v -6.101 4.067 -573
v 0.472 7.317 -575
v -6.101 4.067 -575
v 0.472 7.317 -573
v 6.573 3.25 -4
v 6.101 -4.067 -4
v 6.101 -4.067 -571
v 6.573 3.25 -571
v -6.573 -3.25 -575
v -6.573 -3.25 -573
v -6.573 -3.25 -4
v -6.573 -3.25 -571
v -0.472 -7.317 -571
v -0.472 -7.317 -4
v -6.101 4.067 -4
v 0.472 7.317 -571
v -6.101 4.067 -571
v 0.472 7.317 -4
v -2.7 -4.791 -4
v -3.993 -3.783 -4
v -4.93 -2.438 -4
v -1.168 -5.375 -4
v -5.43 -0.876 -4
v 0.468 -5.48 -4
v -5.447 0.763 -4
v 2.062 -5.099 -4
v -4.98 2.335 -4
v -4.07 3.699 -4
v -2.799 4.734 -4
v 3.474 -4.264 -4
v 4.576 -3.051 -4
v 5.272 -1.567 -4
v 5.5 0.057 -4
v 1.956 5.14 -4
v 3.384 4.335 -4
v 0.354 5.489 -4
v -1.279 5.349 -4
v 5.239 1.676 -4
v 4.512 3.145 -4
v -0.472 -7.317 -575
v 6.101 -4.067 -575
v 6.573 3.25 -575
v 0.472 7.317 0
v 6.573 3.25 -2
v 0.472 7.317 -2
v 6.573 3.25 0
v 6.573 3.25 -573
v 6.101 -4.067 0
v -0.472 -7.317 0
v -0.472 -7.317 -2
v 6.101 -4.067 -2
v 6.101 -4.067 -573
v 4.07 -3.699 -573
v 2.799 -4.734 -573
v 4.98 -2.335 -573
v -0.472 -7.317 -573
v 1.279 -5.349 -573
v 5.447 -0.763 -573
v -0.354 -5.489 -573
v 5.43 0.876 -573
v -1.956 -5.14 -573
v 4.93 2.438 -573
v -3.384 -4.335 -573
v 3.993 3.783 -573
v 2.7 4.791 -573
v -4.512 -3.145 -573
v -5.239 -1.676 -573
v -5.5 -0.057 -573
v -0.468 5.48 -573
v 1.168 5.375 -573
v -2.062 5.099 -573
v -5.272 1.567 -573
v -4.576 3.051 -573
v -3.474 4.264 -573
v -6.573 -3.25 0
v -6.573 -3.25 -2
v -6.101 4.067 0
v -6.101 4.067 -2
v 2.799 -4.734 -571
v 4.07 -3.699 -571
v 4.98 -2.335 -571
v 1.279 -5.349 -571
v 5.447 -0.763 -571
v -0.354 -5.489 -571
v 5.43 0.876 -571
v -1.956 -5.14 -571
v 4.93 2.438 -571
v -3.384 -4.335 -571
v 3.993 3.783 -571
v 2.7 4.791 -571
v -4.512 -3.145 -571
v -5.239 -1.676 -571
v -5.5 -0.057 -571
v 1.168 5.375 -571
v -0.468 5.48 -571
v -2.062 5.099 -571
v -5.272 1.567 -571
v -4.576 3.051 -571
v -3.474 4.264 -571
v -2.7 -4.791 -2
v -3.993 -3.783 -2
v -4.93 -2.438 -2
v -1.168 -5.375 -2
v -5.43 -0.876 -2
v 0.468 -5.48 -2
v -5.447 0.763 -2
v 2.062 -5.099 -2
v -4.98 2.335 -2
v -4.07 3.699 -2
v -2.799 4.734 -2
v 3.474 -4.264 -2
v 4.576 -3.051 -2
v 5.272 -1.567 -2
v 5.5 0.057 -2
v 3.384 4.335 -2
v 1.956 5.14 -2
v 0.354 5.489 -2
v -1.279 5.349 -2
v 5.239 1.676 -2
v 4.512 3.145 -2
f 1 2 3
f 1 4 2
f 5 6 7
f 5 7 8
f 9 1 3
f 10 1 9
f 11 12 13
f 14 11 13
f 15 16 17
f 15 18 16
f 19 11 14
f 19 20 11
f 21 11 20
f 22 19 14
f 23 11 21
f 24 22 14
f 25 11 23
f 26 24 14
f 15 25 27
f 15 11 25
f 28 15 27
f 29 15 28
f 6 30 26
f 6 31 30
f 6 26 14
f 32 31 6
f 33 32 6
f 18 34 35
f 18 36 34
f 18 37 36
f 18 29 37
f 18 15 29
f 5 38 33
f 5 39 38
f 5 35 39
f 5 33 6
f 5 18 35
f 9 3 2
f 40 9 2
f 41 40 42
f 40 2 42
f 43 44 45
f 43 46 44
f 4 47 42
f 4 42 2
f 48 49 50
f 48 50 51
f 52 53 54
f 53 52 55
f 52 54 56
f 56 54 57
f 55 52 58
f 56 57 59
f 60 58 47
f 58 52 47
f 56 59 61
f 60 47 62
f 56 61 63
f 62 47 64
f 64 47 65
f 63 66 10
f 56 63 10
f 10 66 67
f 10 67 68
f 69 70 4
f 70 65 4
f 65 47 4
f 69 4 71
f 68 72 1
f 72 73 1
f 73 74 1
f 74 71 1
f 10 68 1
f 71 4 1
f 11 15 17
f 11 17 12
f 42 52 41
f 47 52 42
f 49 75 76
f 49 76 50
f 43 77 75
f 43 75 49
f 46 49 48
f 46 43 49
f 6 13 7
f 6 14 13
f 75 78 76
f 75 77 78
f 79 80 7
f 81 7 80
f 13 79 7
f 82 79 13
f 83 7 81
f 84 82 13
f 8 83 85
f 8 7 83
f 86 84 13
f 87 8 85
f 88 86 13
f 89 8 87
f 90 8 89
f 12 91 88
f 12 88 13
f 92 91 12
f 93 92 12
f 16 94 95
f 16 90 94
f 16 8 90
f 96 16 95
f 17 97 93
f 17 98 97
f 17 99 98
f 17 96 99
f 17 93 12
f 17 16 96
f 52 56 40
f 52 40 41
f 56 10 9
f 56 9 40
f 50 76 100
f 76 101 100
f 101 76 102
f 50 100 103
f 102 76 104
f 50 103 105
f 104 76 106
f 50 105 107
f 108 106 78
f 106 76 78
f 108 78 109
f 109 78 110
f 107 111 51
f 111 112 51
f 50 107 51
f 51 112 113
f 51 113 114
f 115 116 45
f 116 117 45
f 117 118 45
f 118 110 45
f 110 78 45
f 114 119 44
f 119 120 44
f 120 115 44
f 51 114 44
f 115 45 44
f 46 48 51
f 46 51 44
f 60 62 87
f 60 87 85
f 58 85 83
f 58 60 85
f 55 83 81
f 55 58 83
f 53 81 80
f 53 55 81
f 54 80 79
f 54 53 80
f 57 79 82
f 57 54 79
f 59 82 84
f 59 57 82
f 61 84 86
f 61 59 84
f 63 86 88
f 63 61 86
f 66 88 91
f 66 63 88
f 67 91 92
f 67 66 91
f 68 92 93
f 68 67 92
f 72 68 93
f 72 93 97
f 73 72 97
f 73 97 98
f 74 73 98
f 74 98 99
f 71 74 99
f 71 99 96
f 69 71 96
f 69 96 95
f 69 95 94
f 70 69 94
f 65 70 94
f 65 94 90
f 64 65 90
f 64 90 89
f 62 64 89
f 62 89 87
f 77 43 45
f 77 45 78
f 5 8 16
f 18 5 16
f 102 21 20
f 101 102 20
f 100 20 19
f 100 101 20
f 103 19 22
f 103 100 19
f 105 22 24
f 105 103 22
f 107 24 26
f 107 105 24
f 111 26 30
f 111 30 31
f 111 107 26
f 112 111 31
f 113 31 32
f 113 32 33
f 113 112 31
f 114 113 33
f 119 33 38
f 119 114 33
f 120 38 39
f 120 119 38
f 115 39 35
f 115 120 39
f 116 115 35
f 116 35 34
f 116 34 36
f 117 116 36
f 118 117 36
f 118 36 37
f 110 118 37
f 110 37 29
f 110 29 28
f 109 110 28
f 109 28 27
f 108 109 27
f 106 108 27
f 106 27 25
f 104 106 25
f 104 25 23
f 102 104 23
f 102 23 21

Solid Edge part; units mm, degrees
sketch "Sketch1" plane through (0, 0, 0) normal (0, 0, 1) x (1, 0, 0)
  line L0 (-6.1009, 4.0673) -> (-6.5728, -3.2499)
  line L1 (-6.5728, -3.2499) -> (-0.4719, -7.3171)
  line L2 (-0.4719, -7.3171) -> (6.1009, -4.0673)
  line L3 (6.1009, -4.0673) -> (6.5728, 3.2499)
  line L4 (6.5728, 3.2499) -> (0.4719, 7.3171)
  line L5 (0.4719, 7.3171) -> (-6.1009, 4.0673)
extrude "Protrusion1" add sketch "Sketch1" against normal blind 575
sketch "Sketch2" plane through (0, 0, -2) normal (0, 0, 1) x (-0.8964, -0.4432, 0)
  circle A0 centre (0, 0) radius 5.5
  circle A1 centre (0, 0) radius 13.1424
extrude "ExtrudedCutout_1" cut sketch "Sketch2" against normal blind 2
sketch "Sketch3" plane through (0, 0, -573) normal (0, 0, -1) x (0.8964, 0.4432, 0)
  circle A0 centre (0, 0) radius 5.5
  circle A1 centre (0, 0) radius 13.1424
extrude "ExtrudedCutout_2" cut sketch "Sketch3" against normal blind 2
properties part number "BumbleB0544"
